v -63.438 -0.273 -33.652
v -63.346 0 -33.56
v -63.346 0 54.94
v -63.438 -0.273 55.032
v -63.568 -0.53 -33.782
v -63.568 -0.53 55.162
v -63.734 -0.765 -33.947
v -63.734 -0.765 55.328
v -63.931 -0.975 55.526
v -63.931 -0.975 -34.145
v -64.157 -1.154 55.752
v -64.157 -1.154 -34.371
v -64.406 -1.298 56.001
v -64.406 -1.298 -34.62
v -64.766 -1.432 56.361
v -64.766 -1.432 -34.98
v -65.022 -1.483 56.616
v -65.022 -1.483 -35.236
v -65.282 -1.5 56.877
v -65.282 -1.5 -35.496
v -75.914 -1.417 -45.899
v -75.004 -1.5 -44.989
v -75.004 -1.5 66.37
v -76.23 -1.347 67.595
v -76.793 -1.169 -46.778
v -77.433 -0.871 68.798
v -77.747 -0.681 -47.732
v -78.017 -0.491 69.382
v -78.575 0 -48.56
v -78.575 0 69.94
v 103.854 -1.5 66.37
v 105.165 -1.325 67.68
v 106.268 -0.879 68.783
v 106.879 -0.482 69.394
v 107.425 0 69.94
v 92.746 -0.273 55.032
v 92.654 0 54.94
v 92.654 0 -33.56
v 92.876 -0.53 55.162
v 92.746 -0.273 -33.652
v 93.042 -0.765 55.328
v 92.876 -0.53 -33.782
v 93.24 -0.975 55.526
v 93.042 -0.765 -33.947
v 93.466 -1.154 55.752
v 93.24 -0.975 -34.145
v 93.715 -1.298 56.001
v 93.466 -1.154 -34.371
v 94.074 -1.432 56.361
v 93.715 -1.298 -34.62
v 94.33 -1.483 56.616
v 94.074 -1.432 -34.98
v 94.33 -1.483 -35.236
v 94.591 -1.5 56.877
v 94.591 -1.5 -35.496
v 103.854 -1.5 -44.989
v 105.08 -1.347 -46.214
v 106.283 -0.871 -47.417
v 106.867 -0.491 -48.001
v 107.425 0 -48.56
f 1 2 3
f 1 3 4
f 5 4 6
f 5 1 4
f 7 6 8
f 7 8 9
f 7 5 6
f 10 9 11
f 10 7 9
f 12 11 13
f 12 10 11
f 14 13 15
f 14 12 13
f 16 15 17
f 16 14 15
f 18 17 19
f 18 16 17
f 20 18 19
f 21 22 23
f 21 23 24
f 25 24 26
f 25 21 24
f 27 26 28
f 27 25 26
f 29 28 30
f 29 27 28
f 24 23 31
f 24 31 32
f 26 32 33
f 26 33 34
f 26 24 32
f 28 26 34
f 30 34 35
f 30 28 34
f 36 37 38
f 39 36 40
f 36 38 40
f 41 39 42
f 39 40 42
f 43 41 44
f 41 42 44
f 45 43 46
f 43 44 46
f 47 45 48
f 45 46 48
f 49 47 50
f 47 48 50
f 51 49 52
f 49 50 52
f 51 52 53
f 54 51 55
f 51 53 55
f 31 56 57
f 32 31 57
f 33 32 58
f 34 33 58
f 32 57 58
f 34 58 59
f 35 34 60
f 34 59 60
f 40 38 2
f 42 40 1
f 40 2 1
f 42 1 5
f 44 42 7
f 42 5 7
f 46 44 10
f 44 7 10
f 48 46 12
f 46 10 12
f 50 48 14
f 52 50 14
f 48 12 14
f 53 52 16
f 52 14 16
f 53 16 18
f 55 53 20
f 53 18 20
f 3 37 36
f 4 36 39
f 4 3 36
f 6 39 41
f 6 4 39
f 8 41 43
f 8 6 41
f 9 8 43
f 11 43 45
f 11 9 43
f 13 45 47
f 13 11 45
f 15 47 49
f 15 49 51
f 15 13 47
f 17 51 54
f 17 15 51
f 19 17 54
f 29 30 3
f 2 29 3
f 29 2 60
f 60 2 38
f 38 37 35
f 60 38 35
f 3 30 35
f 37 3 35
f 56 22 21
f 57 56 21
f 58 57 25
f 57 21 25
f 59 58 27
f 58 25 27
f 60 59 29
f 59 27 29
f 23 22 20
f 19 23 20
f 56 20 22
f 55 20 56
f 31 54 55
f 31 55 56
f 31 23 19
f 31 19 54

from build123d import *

# Parameters (mm, degrees)
F0_W         = 15.2291797996
F0_H         = 88.5
F0_W_2       = 14.7708202004
F1_DEPTH     = 1.5
F2_T1_DEPTH  = 88.5
F2_T3_DEPTH  = 156
F2_T9_DEPTH  = 93.3412291828
F2_T13_DEPTH = 160.8412291828
F2_T20_DEPTH = 93.3412291828
F2_T24_DEPTH = 160.8412291828
F2_T31_DEPTH = 160.8412291828
F2_T35_DEPTH = 93.3412291828
F2_T42_DEPTH = 93.3412291828
F2_T46_DEPTH = 160.8412291828
F3_T1_DEPTH  = 203.8535710714
F3_T3_DEPTH  = 136.3535710714


# Not quite as in the source:
# - a fillet or chamfer that OpenCascade refuses, or shapes differently, is made with other operations: its cross-section is extruded or revolved along the edge and cut away or added


with BuildPart() as f1:
    # F0 (on Front) → F1 (new body)
    with BuildSketch(Plane.XZ):
        with Locations((-70.9603581131, 10.6903343201)):
            Rectangle(F0_W, F0_H)
        with Locations((100.0396418869, 10.6903343201)):
            Rectangle(F0_W_2, F0_H)
        Polygon((-78.5749480128, 54.9403343201), (-63.3457682133, 54.9403343201), (92.4250519872, 54.9403343201), (92.6542317867, 54.9403343201), (107.4250519872, 54.9403343201), (107.4250519872, 69.9403343201), (107.4249148369, 69.9403343201), (92.6542317867, 69.9403343201), (-63.3457682133, 69.9403343201), (-78.5749480128, 69.9403343201), (-78.5749480128, 64.060893178), align=None)
        Polygon((92.6542317867, -33.5596656799), (-63.3457682133, -33.5596656799), (-78.5749480128, -33.5596656799), (-78.5749480128, -40.4141508043), (-78.5749480128, -48.5596656799), (-63.5749480128, -48.5596656799), (-63.3457682133, -48.5596656799), (92.6542317867, -48.5596656799), (107.4250519872, -48.5596656799), (107.4250519872, -33.5596656799), align=None)
    extrude(amount=F1_DEPTH)

    # F2: fillet of radius 2 on 4 edges, made by hand

    # F2_s2 → F2_t1 (cut)
    with BuildSketch(Plane.XY.offset(-33.5596656799)):
        with BuildLine():
            ThreePointArc((-63.3457682133, 0), (-64.057515015, -1.0811388301), (-65.2822598864, -1.5))
            Line((-65.2822598864, -1.5), (-63.3457682133, -1.5))
            Line((-63.3457682133, -1.5), (-63.3457682133, 0))
        make_face()
        with BuildLine():
            ThreePointArc((92.6542317867, 0), (93.3659785884, -1.0811388301), (94.5907234598, -1.5))
            Line((94.5907234598, -1.5), (92.6542317867, -1.5))
            Line((92.6542317867, -1.5), (92.6542317867, 0))
        make_face()
    extrude(amount=F2_T1_DEPTH, mode=Mode.SUBTRACT)

    # F2_s4 → F2_t3 (cut)
    with BuildSketch(Plane.YZ.offset(-63.3457682133)):
        with BuildLine():
            ThreePointArc((0, 54.9403343201), (-1.0811388301, 55.6520811218), (-1.5, 56.8768259932))
            Line((-1.5, 56.8768259932), (-1.5, 54.9403343201))
            Line((-1.5, 54.9403343201), (0, 54.9403343201))
        make_face()
        with BuildLine():
            ThreePointArc((0, -33.5596656799), (-1.0811388301, -34.2714124816), (-1.5, -35.496157353))
            Line((-1.5, -35.496157353), (-1.5, -33.5596656799))
            Line((-1.5, -33.5596656799), (0, -33.5596656799))
        make_face()
    extrude(amount=F2_T3_DEPTH, mode=Mode.SUBTRACT)


with BuildPart() as f2_tool7:
    # F2_s8 → F2_t9 (new body)
    with BuildSketch(Plane.XY.offset(-38.4008948627)):
        with BuildLine():
            ThreePointArc((-63.3457682133, 0), (-64.057515015, -1.0811388301), (-65.2822598864, -1.5))
            Line((-65.2822598864, -1.5), (-63.3457682133, -1.5))
            Line((-63.3457682133, -1.5), (-63.3457682133, 0))
        make_face()
    extrude(amount=F2_T9_DEPTH)

    split(bisect_by=Plane.XY.offset(-33.5596656799), keep=Keep.BOTTOM)


with BuildPart() as f2_tool11:
    # F2_s12 → F2_t13 (new body)
    with BuildSketch(Plane.YZ.offset(92.6542317867)):
        with BuildLine():
            ThreePointArc((0, -33.5596656799), (-1.0811388301, -34.2714124816), (-1.5, -35.496157353))
            Line((-1.5, -35.496157353), (-1.5, -33.5596656799))
            Line((-1.5, -33.5596656799), (0, -33.5596656799))
        make_face()
    extrude(amount=-F2_T13_DEPTH)

    split(bisect_by=Plane.YZ.offset(-63.3457682133), keep=Keep.BOTTOM)


with BuildPart() as f2_tool7_1:
    add(f2_tool7.part)

    # F2_t15: intersect F2_tool11
    add(f2_tool11.part, mode=Mode.INTERSECT)


with BuildPart() as f1_1:
    add(f1.part)

    # F2_t5: cut F2_tool7
    add(f2_tool7_1.part, mode=Mode.SUBTRACT)


with BuildPart() as f2_tool18:
    # F2_s19 → F2_t20 (new body)
    with BuildSketch(Plane.XY.offset(-33.5596656799)):
        with BuildLine():
            ThreePointArc((-63.3457682133, 0), (-64.057515015, -1.0811388301), (-65.2822598864, -1.5))
            Line((-65.2822598864, -1.5), (-63.3457682133, -1.5))
            Line((-63.3457682133, -1.5), (-63.3457682133, 0))
        make_face()
    extrude(amount=F2_T20_DEPTH)

    split(bisect_by=Plane.XY.offset(54.9403343201), keep=Keep.TOP)


with BuildPart() as f2_tool22:
    # F2_s23 → F2_t24 (new body)
    with BuildSketch(Plane.YZ.offset(-68.186997396)):
        with BuildLine():
            ThreePointArc((0, 54.9403343201), (-1.0811388301, 55.6520811218), (-1.5, 56.8768259932))
            Line((-1.5, 56.8768259932), (-1.5, 54.9403343201))
            Line((-1.5, 54.9403343201), (0, 54.9403343201))
        make_face()
    extrude(amount=F2_T24_DEPTH)

    split(bisect_by=Plane.YZ.offset(-63.3457682133), keep=Keep.BOTTOM)


with BuildPart() as f2_tool18_1:
    add(f2_tool18.part)

    # F2_t26: intersect F2_tool22
    add(f2_tool22.part, mode=Mode.INTERSECT)


with BuildPart() as f1_2:
    add(f1_1.part)

    # F2_t16: cut F2_tool18
    add(f2_tool18_1.part, mode=Mode.SUBTRACT)


with BuildPart() as f2_tool29:
    # F2_s30 → F2_t31 (new body)
    with BuildSketch(Plane.YZ.offset(-63.3457682133)):
        with BuildLine():
            ThreePointArc((0, 54.9403343201), (-1.0811388301, 55.6520811218), (-1.5, 56.8768259932))
            Line((-1.5, 56.8768259932), (-1.5, 54.9403343201))
            Line((-1.5, 54.9403343201), (0, 54.9403343201))
        make_face()
    extrude(amount=F2_T31_DEPTH)

    split(bisect_by=Plane.YZ.offset(92.6542317867), keep=Keep.TOP)


with BuildPart() as f2_tool33:
    # F2_s34 → F2_t35 (new body)
    with BuildSketch(Plane.XY.offset(59.7815635028)):
        with BuildLine():
            ThreePointArc((92.6542317867, 0), (93.3659785884, -1.0811388301), (94.5907234598, -1.5))
            Line((94.5907234598, -1.5), (92.6542317867, -1.5))
            Line((92.6542317867, -1.5), (92.6542317867, 0))
        make_face()
    extrude(amount=-F2_T35_DEPTH)

    split(bisect_by=Plane.XY.offset(54.9403343201), keep=Keep.TOP)


with BuildPart() as f2_tool29_1:
    add(f2_tool29.part)

    # F2_t37: intersect F2_tool33
    add(f2_tool33.part, mode=Mode.INTERSECT)


with BuildPart() as f1_3:
    add(f1_2.part)

    # F2_t27: cut F2_tool29
    add(f2_tool29_1.part, mode=Mode.SUBTRACT)


with BuildPart() as f2_tool40:
    # F2_s41 → F2_t42 (new body)
    with BuildSketch(Plane.XY.offset(54.9403343201)):
        with BuildLine():
            ThreePointArc((92.6542317867, 0), (93.3659785884, -1.0811388301), (94.5907234598, -1.5))
            Line((94.5907234598, -1.5), (92.6542317867, -1.5))
            Line((92.6542317867, -1.5), (92.6542317867, 0))
        make_face()
    extrude(amount=-F2_T42_DEPTH)

    split(bisect_by=Plane.XY.offset(-33.5596656799), keep=Keep.BOTTOM)


with BuildPart() as f2_tool44:
    # F2_s45 → F2_t46 (new body)
    with BuildSketch(Plane.YZ.offset(97.4954609695)):
        with BuildLine():
            ThreePointArc((0, -33.5596656799), (-1.0811388301, -34.2714124816), (-1.5, -35.496157353))
            Line((-1.5, -35.496157353), (-1.5, -33.5596656799))
            Line((-1.5, -33.5596656799), (0, -33.5596656799))
        make_face()
    extrude(amount=-F2_T46_DEPTH)

    split(bisect_by=Plane.YZ.offset(92.6542317867), keep=Keep.TOP)


with BuildPart() as f2_tool40_1:
    add(f2_tool40.part)

    # F2_t48: intersect F2_tool44
    add(f2_tool44.part, mode=Mode.INTERSECT)


with BuildPart() as f1_4:
    add(f1_3.part)

    # F2_t38: cut F2_tool40
    add(f2_tool40_1.part, mode=Mode.SUBTRACT)

    # F3: fillet of radius 5 on 4 edges, made by hand

    # F3_s2 → F3_t1 (cut)
    with BuildSketch(Plane.YZ.offset(-87.5017335485)):
        with BuildLine():
            ThreePointArc((-1.5, 66.3696201058), (-1.1097722286, 68.3061117789), (0, 69.9403343201))
            Line((0, 69.9403343201), (-1.5, 69.9403343201))
            Line((-1.5, 69.9403343201), (-1.5, 66.3696201058))
        make_face()
        with BuildLine():
            ThreePointArc((-1.5, -44.9889514657), (-1.1097722286, -46.9254431388), (0, -48.5596656799))
            Line((0, -48.5596656799), (-1.5, -48.5596656799))
            Line((-1.5, -48.5596656799), (-1.5, -44.9889514657))
        make_face()
    extrude(amount=F3_T1_DEPTH, mode=Mode.SUBTRACT)

    # F3_s4 → F3_t3 (cut)
    with BuildSketch(Plane.XY.offset(-57.4864512156)):
        with BuildLine():
            ThreePointArc((103.8543377729, -1.5), (105.790829446, -1.1097722286), (107.4250519872, 0))
            Line((107.4250519872, 0), (107.4250519872, -1.5))
            Line((107.4250519872, -1.5), (103.8543377729, -1.5))
        make_face()
        with BuildLine():
            ThreePointArc((-75.0042337986, -1.5), (-76.9407254717, -1.1097722286), (-78.5749480128, 0))
            Line((-78.5749480128, 0), (-78.5749480128, -1.5))
            Line((-78.5749480128, -1.5), (-75.0042337986, -1.5))
        make_face()
    extrude(amount=F3_T3_DEPTH, mode=Mode.SUBTRACT)


solid = f1_4.part
